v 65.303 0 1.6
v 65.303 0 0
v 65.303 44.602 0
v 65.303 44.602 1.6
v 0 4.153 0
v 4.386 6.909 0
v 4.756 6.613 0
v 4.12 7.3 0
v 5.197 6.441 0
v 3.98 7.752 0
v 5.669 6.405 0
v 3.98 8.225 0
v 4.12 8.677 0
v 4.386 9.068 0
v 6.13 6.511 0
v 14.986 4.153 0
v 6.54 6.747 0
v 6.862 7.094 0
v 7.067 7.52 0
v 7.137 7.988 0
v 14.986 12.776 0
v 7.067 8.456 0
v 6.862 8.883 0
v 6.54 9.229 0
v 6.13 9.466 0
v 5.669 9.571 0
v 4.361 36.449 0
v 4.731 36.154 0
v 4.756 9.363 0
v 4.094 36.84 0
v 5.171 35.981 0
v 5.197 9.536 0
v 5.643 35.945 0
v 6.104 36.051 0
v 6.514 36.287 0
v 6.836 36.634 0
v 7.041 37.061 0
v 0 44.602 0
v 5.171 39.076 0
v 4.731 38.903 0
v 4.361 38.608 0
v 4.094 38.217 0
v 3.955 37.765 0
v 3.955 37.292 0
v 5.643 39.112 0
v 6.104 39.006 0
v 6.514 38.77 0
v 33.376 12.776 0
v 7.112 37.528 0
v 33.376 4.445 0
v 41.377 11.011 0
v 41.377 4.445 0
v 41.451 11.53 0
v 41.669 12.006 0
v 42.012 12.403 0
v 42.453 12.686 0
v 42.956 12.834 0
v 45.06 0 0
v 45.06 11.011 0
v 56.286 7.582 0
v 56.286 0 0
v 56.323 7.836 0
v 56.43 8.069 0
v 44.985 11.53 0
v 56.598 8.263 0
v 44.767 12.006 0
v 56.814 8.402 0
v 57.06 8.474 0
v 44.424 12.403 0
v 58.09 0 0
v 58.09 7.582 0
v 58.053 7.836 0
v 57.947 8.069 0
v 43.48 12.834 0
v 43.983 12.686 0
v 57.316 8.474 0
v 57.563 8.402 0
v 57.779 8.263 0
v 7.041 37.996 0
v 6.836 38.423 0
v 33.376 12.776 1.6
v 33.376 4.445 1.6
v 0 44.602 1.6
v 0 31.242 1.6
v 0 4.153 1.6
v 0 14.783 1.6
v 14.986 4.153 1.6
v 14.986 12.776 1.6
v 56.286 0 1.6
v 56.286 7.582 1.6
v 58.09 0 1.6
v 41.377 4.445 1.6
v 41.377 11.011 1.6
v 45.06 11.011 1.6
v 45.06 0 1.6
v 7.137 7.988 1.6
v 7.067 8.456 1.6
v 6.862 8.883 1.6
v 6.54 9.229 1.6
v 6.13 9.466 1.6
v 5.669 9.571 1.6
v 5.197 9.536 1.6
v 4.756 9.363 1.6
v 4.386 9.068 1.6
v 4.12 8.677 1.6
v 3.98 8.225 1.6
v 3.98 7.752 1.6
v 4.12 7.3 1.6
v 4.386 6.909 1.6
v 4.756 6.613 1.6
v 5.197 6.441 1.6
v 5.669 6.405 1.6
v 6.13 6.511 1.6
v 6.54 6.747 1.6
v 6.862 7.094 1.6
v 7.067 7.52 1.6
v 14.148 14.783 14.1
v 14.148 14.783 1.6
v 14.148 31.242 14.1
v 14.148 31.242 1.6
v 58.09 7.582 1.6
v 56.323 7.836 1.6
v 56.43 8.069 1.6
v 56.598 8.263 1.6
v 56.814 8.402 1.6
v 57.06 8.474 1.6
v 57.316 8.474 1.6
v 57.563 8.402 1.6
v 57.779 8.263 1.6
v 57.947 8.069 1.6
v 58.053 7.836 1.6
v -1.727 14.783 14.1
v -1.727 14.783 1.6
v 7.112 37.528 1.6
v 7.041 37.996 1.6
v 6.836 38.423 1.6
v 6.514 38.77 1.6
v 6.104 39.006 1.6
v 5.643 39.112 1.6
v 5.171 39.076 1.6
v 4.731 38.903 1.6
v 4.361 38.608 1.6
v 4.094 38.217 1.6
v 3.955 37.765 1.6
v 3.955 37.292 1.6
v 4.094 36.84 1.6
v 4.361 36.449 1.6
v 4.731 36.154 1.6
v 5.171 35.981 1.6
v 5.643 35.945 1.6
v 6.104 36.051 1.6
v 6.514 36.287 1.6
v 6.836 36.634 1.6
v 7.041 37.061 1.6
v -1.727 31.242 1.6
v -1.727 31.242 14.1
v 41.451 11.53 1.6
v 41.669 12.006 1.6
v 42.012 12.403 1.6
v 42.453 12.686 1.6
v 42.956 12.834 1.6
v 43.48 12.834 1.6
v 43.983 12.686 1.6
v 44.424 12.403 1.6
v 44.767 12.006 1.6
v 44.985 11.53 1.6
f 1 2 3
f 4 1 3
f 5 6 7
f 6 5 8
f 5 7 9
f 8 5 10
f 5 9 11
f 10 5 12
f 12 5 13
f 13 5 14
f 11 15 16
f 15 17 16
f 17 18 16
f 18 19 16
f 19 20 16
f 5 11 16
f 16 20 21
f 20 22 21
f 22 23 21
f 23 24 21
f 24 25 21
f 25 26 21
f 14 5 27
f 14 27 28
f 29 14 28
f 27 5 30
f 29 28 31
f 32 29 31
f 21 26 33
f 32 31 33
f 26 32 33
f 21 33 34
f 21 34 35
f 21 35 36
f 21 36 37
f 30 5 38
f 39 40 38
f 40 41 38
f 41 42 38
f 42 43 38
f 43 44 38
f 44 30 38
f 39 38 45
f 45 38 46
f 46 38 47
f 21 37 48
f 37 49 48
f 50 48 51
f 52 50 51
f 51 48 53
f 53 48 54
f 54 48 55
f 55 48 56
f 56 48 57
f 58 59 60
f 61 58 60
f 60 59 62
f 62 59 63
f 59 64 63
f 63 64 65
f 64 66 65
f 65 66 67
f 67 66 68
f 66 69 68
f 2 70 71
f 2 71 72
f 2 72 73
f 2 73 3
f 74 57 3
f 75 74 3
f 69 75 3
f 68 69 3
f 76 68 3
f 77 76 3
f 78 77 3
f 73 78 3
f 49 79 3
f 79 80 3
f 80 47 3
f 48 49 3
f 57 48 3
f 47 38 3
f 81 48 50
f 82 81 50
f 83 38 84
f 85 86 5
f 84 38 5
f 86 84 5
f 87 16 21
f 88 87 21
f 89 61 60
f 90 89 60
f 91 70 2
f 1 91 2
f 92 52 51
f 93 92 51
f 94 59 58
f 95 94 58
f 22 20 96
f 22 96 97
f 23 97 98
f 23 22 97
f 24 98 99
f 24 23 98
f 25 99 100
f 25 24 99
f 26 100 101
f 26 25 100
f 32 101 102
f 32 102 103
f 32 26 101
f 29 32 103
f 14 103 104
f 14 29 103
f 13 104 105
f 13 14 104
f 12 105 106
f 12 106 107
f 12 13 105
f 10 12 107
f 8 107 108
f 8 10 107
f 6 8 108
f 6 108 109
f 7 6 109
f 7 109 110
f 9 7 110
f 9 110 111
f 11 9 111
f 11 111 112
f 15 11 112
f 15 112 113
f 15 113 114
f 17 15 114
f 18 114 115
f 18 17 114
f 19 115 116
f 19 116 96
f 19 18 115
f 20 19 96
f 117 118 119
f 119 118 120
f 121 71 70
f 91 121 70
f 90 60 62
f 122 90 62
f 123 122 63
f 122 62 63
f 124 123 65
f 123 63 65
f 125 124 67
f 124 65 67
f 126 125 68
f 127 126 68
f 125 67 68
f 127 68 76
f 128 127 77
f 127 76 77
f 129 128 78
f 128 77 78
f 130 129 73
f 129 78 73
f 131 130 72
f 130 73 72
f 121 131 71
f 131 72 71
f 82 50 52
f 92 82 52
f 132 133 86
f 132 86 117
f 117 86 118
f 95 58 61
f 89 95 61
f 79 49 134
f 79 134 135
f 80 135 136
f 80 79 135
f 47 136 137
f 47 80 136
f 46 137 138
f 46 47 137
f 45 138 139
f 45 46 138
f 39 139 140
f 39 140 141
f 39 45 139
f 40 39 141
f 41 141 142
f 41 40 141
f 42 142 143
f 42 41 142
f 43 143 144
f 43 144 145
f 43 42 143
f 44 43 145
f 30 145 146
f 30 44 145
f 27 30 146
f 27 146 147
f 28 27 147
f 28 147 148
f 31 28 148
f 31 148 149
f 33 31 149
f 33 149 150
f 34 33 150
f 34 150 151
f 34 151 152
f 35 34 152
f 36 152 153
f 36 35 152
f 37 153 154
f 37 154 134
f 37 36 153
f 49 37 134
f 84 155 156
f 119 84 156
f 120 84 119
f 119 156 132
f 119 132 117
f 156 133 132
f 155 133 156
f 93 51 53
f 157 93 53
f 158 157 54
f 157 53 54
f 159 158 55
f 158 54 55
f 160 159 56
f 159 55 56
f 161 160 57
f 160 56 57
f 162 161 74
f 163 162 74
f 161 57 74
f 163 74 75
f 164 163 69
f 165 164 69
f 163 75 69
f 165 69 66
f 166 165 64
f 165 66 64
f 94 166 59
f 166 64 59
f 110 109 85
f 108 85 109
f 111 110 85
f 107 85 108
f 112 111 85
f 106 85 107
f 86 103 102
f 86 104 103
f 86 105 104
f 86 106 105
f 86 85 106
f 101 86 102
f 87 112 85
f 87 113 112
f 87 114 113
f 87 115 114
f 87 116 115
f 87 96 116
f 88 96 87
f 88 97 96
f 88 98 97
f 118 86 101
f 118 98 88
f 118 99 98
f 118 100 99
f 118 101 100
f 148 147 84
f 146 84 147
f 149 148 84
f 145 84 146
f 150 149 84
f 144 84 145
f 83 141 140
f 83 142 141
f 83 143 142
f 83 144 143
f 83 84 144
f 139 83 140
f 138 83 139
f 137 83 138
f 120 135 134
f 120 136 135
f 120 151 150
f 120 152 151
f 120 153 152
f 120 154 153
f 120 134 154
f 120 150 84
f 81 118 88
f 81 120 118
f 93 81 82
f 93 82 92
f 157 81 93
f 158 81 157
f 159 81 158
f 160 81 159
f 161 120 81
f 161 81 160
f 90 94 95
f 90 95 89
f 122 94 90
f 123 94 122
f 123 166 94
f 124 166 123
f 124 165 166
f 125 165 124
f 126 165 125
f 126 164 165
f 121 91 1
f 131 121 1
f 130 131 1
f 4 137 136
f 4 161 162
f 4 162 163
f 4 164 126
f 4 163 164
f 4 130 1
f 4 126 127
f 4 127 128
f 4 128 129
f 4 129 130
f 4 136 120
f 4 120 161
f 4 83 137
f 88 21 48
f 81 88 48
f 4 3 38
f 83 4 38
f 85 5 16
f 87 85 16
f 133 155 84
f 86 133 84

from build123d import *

# Parameters (mm, degrees)
SKETCH2_R           = 1.5875
BOSS_EXTRUDE1_DEPTH = 1.6
SKETCH3_W           = 15.875
SKETCH3_H           = 16.4592
BOSS_EXTRUDE2_DEPTH = 12.5


with BuildPart() as part:
    # Sketch2 → Boss-Extrude1 (new body)
    with BuildSketch(Plane.XY):
        with BuildLine():
            Line((0, 4.1529), (14.986, 4.1529))
            Line((14.986, 4.1529), (14.986, 12.7762))
            Line((14.986, 12.7762), (33.3756, 12.7762))
            Line((33.3756, 12.7762), (33.3756, 4.445))
            Line((33.3756, 4.445), (41.3766, 4.445))
            Line((41.3766, 4.445), (41.3766, 11.0109))
            ThreePointArc((41.3766, 11.0109), (43.2181, 12.8524), (45.0596, 11.0109))
            Line((45.0596, 11.0109), (45.0596, 0))
            Line((45.0596, 0), (56.2864, 0))
            Line((56.2864, 0), (56.2864, 7.5819))
            ThreePointArc((56.2864, 7.5819), (57.1881, 8.4836), (58.0898, 7.5819))
            Line((58.0898, 7.5819), (58.0898, 0))
            Line((58.0898, 0), (65.3034, 0))
            Line((65.3034, 0), (65.3034, 44.6024))
            Line((65.3034, 44.6024), (0, 44.6024))
            Line((0, 44.6024), (0, 4.1529))
        make_face()
        with Locations((5.5245, 37.5285)):
            Circle(SKETCH2_R, mode=Mode.SUBTRACT)
        with Locations((5.55, 7.9883)):
            Circle(SKETCH2_R, mode=Mode.SUBTRACT)
    extrude(amount=BOSS_EXTRUDE1_DEPTH)

    # Sketch3 → Boss-Extrude2 (add)
    with BuildSketch(Plane.XY.offset(1.6)):
        with Locations((6.2103, 23.0124)):
            Rectangle(SKETCH3_W, SKETCH3_H)
    extrude(amount=BOSS_EXTRUDE2_DEPTH)


solid = part.part
